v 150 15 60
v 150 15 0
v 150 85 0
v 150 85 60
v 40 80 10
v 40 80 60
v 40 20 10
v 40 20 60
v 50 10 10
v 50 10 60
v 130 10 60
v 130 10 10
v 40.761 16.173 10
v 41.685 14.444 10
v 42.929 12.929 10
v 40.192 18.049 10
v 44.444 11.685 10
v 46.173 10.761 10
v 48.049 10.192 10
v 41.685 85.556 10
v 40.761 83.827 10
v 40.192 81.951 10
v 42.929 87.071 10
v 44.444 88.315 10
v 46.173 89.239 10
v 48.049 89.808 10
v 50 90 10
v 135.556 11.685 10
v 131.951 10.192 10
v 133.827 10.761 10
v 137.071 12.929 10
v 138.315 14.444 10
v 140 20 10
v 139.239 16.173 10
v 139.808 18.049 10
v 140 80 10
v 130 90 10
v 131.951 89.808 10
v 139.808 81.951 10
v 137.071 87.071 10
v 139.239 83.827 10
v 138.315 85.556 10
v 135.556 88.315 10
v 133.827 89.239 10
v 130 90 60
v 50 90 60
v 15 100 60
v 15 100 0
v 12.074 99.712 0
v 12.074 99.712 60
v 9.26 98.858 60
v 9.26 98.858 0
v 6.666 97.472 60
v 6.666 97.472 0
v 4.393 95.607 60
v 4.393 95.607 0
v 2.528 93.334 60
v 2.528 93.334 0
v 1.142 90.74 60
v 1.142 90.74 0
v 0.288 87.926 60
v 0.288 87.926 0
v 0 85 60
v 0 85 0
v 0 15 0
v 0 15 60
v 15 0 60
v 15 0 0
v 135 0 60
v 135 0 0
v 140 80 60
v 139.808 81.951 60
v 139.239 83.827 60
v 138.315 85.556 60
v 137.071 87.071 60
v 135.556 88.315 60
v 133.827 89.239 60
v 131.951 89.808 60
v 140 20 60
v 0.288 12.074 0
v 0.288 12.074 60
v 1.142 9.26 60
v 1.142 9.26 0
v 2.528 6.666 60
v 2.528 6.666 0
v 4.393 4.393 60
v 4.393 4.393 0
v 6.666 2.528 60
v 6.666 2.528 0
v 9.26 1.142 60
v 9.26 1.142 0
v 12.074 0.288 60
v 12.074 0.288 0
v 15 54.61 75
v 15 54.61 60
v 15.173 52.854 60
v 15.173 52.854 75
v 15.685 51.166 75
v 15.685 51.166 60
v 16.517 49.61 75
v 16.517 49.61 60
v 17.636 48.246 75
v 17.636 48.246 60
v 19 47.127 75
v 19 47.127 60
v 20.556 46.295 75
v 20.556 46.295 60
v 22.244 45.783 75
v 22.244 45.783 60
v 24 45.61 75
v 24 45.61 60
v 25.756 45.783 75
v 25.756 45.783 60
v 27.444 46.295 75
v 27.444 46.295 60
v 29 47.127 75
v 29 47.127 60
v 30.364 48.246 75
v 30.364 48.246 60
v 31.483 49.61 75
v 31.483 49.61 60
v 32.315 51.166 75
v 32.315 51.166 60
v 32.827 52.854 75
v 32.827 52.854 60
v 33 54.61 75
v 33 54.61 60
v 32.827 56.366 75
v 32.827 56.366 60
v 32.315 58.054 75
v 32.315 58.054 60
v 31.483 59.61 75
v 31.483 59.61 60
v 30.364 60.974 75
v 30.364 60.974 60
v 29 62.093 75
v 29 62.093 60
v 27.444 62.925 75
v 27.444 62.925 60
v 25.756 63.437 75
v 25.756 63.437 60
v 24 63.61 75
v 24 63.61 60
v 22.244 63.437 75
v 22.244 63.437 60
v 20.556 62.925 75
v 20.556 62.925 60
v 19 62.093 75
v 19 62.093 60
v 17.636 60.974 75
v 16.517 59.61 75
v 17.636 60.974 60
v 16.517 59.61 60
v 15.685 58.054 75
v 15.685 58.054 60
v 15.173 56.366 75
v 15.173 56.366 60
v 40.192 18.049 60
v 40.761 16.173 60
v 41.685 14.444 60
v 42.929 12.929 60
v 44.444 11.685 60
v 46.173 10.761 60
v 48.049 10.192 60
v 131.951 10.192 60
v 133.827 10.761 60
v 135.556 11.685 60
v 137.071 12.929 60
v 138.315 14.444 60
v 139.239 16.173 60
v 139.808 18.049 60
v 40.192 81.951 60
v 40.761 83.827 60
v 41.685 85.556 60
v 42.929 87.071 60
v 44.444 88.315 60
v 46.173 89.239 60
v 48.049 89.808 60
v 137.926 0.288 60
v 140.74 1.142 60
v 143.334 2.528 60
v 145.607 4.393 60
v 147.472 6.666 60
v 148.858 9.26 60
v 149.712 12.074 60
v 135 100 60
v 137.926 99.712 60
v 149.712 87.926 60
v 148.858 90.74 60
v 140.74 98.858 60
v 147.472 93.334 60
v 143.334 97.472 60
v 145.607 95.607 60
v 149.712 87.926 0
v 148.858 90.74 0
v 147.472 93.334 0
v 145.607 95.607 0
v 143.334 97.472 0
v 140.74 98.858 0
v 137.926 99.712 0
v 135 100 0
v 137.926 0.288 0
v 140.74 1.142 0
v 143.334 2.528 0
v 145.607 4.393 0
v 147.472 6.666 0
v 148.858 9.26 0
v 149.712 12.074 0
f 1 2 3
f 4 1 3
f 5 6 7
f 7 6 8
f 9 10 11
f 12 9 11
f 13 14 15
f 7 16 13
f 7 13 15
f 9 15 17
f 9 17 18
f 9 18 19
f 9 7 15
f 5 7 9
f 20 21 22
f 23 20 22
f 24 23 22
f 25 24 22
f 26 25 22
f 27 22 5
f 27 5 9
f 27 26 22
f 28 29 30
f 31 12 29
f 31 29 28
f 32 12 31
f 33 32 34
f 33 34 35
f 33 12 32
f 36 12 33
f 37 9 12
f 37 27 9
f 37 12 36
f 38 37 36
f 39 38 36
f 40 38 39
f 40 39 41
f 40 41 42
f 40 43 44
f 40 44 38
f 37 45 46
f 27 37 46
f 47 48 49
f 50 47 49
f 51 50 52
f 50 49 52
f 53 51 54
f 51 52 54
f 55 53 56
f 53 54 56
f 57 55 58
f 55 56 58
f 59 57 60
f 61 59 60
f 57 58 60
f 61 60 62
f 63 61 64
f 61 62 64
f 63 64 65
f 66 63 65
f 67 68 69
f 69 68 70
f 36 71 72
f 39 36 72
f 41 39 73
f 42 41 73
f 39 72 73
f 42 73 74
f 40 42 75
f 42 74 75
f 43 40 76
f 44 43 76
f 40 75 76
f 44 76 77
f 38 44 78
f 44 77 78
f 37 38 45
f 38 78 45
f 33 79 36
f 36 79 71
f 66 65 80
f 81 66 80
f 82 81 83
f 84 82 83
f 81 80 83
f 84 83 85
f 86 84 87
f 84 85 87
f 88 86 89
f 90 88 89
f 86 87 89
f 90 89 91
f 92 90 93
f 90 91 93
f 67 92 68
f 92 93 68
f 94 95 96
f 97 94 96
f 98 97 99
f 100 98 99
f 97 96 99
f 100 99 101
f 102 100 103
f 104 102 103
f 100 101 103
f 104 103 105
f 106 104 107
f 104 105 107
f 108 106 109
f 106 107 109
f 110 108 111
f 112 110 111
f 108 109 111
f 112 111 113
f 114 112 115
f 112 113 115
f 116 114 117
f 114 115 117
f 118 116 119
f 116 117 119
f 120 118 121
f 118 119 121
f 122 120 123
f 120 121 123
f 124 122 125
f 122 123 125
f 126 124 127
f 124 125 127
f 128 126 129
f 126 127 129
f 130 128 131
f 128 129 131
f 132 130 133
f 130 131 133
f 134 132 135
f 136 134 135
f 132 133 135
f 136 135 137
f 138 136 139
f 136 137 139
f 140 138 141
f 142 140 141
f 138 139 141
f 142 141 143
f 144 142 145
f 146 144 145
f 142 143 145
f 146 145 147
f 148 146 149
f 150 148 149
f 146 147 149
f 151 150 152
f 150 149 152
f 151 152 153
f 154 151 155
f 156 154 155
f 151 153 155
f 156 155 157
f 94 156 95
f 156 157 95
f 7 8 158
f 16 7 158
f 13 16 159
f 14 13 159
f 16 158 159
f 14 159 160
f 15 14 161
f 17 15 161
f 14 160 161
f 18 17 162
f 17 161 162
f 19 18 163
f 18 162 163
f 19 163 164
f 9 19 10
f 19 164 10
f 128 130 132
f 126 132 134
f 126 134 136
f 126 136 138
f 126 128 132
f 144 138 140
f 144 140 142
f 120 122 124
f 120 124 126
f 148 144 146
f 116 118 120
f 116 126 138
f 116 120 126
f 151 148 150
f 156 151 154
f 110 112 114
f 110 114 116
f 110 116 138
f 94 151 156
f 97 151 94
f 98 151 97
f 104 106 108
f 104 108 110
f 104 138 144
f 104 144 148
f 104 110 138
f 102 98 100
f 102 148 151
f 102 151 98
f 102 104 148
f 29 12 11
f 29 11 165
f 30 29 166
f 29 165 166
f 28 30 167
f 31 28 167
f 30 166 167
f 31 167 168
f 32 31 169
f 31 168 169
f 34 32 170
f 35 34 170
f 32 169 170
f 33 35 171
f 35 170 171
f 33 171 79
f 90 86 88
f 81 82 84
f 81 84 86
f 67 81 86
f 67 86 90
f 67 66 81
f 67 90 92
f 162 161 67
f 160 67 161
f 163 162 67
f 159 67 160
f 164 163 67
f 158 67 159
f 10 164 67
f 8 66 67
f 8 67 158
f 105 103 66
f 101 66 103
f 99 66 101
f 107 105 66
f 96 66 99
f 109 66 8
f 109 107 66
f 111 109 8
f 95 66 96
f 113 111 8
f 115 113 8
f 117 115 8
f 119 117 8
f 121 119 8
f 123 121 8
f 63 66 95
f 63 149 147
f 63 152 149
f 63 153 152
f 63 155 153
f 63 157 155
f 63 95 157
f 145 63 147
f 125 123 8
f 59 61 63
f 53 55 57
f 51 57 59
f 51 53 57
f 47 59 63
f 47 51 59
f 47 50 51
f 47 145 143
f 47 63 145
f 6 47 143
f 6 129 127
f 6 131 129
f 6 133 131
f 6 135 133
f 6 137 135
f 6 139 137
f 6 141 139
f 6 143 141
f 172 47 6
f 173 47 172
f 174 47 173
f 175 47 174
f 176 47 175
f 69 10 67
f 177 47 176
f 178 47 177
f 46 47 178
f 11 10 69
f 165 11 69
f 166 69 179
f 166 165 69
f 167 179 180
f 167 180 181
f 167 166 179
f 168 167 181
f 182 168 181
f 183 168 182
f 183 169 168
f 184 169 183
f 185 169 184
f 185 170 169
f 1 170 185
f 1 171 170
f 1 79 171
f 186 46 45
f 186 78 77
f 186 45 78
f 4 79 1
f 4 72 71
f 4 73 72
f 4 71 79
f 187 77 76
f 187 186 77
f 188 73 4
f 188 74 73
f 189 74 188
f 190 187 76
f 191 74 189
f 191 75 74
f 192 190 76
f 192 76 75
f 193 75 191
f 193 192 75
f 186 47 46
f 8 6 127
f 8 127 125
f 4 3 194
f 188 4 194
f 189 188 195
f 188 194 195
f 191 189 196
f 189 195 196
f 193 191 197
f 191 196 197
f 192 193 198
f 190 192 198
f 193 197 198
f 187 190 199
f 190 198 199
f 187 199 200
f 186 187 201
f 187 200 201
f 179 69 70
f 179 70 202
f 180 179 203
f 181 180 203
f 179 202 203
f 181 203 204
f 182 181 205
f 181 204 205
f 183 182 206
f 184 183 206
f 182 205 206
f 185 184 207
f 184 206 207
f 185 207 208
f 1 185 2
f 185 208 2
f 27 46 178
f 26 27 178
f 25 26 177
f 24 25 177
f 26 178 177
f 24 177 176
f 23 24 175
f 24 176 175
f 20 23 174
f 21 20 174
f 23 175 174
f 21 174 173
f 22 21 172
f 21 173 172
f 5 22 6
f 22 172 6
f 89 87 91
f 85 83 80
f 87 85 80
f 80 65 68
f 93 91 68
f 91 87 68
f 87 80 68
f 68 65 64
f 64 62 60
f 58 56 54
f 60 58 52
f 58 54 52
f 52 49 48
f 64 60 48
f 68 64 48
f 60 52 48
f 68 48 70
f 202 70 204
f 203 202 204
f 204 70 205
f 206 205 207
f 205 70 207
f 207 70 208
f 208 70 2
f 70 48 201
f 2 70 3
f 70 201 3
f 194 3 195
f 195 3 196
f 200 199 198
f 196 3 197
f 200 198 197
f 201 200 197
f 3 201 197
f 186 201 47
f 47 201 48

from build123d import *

# Parameters (mm, degrees)
BASE_EXTRUDE_DEPTH  = 60
CUT_EXTRUDE1_DEPTH  = 50
SKETCH3_R           = 9
BOSS_EXTRUDE1_DEPTH = 15


with BuildPart() as part:
    # Sketch1 → Base-Extrude (new body)
    with BuildSketch(Plane.XY):
        with BuildLine():
            Line((15, 0), (135, 0))
            ThreePointArc((135, 0), (145.606601718, 4.393398282), (150, 15))
            Line((150, 15), (150, 85))
            ThreePointArc((150, 85), (145.606601718, 95.606601718), (135, 100))
            Line((135, 100), (15, 100))
            ThreePointArc((15, 100), (4.393398282, 95.606601718), (0, 85))
            Line((0, 85), (0, 15))
            ThreePointArc((0, 15), (4.393398282, 4.393398282), (15, 0))
        make_face()
    extrude(amount=BASE_EXTRUDE_DEPTH)

    # Sketch2 → Cut-Extrude1 (cut)
    with BuildSketch(Plane.XY.offset(60)):
        with BuildLine():
            Line((40, 80), (40, 20))
            ThreePointArc((40, 20), (42.928932188, 12.928932188), (50, 10))
            Line((50, 10), (130, 10))
            ThreePointArc((130, 10), (137.071067812, 12.928932188), (140, 20))
            Line((140, 20), (140, 80))
            ThreePointArc((140, 80), (137.071067812, 87.071067812), (130, 90))
            Line((130, 90), (50, 90))
            ThreePointArc((50, 90), (42.928932188, 87.071067812), (40, 80))
        make_face()
    extrude(amount=-CUT_EXTRUDE1_DEPTH, mode=Mode.SUBTRACT)

    # Sketch3 → Boss-Extrude1 (add)
    with BuildSketch(Plane.XY.offset(60)):
        with Locations(Location((24, 54.61, 0), (0, 0, 180))):
            Circle(SKETCH3_R)
    extrude(amount=BOSS_EXTRUDE1_DEPTH)


solid = part.part
